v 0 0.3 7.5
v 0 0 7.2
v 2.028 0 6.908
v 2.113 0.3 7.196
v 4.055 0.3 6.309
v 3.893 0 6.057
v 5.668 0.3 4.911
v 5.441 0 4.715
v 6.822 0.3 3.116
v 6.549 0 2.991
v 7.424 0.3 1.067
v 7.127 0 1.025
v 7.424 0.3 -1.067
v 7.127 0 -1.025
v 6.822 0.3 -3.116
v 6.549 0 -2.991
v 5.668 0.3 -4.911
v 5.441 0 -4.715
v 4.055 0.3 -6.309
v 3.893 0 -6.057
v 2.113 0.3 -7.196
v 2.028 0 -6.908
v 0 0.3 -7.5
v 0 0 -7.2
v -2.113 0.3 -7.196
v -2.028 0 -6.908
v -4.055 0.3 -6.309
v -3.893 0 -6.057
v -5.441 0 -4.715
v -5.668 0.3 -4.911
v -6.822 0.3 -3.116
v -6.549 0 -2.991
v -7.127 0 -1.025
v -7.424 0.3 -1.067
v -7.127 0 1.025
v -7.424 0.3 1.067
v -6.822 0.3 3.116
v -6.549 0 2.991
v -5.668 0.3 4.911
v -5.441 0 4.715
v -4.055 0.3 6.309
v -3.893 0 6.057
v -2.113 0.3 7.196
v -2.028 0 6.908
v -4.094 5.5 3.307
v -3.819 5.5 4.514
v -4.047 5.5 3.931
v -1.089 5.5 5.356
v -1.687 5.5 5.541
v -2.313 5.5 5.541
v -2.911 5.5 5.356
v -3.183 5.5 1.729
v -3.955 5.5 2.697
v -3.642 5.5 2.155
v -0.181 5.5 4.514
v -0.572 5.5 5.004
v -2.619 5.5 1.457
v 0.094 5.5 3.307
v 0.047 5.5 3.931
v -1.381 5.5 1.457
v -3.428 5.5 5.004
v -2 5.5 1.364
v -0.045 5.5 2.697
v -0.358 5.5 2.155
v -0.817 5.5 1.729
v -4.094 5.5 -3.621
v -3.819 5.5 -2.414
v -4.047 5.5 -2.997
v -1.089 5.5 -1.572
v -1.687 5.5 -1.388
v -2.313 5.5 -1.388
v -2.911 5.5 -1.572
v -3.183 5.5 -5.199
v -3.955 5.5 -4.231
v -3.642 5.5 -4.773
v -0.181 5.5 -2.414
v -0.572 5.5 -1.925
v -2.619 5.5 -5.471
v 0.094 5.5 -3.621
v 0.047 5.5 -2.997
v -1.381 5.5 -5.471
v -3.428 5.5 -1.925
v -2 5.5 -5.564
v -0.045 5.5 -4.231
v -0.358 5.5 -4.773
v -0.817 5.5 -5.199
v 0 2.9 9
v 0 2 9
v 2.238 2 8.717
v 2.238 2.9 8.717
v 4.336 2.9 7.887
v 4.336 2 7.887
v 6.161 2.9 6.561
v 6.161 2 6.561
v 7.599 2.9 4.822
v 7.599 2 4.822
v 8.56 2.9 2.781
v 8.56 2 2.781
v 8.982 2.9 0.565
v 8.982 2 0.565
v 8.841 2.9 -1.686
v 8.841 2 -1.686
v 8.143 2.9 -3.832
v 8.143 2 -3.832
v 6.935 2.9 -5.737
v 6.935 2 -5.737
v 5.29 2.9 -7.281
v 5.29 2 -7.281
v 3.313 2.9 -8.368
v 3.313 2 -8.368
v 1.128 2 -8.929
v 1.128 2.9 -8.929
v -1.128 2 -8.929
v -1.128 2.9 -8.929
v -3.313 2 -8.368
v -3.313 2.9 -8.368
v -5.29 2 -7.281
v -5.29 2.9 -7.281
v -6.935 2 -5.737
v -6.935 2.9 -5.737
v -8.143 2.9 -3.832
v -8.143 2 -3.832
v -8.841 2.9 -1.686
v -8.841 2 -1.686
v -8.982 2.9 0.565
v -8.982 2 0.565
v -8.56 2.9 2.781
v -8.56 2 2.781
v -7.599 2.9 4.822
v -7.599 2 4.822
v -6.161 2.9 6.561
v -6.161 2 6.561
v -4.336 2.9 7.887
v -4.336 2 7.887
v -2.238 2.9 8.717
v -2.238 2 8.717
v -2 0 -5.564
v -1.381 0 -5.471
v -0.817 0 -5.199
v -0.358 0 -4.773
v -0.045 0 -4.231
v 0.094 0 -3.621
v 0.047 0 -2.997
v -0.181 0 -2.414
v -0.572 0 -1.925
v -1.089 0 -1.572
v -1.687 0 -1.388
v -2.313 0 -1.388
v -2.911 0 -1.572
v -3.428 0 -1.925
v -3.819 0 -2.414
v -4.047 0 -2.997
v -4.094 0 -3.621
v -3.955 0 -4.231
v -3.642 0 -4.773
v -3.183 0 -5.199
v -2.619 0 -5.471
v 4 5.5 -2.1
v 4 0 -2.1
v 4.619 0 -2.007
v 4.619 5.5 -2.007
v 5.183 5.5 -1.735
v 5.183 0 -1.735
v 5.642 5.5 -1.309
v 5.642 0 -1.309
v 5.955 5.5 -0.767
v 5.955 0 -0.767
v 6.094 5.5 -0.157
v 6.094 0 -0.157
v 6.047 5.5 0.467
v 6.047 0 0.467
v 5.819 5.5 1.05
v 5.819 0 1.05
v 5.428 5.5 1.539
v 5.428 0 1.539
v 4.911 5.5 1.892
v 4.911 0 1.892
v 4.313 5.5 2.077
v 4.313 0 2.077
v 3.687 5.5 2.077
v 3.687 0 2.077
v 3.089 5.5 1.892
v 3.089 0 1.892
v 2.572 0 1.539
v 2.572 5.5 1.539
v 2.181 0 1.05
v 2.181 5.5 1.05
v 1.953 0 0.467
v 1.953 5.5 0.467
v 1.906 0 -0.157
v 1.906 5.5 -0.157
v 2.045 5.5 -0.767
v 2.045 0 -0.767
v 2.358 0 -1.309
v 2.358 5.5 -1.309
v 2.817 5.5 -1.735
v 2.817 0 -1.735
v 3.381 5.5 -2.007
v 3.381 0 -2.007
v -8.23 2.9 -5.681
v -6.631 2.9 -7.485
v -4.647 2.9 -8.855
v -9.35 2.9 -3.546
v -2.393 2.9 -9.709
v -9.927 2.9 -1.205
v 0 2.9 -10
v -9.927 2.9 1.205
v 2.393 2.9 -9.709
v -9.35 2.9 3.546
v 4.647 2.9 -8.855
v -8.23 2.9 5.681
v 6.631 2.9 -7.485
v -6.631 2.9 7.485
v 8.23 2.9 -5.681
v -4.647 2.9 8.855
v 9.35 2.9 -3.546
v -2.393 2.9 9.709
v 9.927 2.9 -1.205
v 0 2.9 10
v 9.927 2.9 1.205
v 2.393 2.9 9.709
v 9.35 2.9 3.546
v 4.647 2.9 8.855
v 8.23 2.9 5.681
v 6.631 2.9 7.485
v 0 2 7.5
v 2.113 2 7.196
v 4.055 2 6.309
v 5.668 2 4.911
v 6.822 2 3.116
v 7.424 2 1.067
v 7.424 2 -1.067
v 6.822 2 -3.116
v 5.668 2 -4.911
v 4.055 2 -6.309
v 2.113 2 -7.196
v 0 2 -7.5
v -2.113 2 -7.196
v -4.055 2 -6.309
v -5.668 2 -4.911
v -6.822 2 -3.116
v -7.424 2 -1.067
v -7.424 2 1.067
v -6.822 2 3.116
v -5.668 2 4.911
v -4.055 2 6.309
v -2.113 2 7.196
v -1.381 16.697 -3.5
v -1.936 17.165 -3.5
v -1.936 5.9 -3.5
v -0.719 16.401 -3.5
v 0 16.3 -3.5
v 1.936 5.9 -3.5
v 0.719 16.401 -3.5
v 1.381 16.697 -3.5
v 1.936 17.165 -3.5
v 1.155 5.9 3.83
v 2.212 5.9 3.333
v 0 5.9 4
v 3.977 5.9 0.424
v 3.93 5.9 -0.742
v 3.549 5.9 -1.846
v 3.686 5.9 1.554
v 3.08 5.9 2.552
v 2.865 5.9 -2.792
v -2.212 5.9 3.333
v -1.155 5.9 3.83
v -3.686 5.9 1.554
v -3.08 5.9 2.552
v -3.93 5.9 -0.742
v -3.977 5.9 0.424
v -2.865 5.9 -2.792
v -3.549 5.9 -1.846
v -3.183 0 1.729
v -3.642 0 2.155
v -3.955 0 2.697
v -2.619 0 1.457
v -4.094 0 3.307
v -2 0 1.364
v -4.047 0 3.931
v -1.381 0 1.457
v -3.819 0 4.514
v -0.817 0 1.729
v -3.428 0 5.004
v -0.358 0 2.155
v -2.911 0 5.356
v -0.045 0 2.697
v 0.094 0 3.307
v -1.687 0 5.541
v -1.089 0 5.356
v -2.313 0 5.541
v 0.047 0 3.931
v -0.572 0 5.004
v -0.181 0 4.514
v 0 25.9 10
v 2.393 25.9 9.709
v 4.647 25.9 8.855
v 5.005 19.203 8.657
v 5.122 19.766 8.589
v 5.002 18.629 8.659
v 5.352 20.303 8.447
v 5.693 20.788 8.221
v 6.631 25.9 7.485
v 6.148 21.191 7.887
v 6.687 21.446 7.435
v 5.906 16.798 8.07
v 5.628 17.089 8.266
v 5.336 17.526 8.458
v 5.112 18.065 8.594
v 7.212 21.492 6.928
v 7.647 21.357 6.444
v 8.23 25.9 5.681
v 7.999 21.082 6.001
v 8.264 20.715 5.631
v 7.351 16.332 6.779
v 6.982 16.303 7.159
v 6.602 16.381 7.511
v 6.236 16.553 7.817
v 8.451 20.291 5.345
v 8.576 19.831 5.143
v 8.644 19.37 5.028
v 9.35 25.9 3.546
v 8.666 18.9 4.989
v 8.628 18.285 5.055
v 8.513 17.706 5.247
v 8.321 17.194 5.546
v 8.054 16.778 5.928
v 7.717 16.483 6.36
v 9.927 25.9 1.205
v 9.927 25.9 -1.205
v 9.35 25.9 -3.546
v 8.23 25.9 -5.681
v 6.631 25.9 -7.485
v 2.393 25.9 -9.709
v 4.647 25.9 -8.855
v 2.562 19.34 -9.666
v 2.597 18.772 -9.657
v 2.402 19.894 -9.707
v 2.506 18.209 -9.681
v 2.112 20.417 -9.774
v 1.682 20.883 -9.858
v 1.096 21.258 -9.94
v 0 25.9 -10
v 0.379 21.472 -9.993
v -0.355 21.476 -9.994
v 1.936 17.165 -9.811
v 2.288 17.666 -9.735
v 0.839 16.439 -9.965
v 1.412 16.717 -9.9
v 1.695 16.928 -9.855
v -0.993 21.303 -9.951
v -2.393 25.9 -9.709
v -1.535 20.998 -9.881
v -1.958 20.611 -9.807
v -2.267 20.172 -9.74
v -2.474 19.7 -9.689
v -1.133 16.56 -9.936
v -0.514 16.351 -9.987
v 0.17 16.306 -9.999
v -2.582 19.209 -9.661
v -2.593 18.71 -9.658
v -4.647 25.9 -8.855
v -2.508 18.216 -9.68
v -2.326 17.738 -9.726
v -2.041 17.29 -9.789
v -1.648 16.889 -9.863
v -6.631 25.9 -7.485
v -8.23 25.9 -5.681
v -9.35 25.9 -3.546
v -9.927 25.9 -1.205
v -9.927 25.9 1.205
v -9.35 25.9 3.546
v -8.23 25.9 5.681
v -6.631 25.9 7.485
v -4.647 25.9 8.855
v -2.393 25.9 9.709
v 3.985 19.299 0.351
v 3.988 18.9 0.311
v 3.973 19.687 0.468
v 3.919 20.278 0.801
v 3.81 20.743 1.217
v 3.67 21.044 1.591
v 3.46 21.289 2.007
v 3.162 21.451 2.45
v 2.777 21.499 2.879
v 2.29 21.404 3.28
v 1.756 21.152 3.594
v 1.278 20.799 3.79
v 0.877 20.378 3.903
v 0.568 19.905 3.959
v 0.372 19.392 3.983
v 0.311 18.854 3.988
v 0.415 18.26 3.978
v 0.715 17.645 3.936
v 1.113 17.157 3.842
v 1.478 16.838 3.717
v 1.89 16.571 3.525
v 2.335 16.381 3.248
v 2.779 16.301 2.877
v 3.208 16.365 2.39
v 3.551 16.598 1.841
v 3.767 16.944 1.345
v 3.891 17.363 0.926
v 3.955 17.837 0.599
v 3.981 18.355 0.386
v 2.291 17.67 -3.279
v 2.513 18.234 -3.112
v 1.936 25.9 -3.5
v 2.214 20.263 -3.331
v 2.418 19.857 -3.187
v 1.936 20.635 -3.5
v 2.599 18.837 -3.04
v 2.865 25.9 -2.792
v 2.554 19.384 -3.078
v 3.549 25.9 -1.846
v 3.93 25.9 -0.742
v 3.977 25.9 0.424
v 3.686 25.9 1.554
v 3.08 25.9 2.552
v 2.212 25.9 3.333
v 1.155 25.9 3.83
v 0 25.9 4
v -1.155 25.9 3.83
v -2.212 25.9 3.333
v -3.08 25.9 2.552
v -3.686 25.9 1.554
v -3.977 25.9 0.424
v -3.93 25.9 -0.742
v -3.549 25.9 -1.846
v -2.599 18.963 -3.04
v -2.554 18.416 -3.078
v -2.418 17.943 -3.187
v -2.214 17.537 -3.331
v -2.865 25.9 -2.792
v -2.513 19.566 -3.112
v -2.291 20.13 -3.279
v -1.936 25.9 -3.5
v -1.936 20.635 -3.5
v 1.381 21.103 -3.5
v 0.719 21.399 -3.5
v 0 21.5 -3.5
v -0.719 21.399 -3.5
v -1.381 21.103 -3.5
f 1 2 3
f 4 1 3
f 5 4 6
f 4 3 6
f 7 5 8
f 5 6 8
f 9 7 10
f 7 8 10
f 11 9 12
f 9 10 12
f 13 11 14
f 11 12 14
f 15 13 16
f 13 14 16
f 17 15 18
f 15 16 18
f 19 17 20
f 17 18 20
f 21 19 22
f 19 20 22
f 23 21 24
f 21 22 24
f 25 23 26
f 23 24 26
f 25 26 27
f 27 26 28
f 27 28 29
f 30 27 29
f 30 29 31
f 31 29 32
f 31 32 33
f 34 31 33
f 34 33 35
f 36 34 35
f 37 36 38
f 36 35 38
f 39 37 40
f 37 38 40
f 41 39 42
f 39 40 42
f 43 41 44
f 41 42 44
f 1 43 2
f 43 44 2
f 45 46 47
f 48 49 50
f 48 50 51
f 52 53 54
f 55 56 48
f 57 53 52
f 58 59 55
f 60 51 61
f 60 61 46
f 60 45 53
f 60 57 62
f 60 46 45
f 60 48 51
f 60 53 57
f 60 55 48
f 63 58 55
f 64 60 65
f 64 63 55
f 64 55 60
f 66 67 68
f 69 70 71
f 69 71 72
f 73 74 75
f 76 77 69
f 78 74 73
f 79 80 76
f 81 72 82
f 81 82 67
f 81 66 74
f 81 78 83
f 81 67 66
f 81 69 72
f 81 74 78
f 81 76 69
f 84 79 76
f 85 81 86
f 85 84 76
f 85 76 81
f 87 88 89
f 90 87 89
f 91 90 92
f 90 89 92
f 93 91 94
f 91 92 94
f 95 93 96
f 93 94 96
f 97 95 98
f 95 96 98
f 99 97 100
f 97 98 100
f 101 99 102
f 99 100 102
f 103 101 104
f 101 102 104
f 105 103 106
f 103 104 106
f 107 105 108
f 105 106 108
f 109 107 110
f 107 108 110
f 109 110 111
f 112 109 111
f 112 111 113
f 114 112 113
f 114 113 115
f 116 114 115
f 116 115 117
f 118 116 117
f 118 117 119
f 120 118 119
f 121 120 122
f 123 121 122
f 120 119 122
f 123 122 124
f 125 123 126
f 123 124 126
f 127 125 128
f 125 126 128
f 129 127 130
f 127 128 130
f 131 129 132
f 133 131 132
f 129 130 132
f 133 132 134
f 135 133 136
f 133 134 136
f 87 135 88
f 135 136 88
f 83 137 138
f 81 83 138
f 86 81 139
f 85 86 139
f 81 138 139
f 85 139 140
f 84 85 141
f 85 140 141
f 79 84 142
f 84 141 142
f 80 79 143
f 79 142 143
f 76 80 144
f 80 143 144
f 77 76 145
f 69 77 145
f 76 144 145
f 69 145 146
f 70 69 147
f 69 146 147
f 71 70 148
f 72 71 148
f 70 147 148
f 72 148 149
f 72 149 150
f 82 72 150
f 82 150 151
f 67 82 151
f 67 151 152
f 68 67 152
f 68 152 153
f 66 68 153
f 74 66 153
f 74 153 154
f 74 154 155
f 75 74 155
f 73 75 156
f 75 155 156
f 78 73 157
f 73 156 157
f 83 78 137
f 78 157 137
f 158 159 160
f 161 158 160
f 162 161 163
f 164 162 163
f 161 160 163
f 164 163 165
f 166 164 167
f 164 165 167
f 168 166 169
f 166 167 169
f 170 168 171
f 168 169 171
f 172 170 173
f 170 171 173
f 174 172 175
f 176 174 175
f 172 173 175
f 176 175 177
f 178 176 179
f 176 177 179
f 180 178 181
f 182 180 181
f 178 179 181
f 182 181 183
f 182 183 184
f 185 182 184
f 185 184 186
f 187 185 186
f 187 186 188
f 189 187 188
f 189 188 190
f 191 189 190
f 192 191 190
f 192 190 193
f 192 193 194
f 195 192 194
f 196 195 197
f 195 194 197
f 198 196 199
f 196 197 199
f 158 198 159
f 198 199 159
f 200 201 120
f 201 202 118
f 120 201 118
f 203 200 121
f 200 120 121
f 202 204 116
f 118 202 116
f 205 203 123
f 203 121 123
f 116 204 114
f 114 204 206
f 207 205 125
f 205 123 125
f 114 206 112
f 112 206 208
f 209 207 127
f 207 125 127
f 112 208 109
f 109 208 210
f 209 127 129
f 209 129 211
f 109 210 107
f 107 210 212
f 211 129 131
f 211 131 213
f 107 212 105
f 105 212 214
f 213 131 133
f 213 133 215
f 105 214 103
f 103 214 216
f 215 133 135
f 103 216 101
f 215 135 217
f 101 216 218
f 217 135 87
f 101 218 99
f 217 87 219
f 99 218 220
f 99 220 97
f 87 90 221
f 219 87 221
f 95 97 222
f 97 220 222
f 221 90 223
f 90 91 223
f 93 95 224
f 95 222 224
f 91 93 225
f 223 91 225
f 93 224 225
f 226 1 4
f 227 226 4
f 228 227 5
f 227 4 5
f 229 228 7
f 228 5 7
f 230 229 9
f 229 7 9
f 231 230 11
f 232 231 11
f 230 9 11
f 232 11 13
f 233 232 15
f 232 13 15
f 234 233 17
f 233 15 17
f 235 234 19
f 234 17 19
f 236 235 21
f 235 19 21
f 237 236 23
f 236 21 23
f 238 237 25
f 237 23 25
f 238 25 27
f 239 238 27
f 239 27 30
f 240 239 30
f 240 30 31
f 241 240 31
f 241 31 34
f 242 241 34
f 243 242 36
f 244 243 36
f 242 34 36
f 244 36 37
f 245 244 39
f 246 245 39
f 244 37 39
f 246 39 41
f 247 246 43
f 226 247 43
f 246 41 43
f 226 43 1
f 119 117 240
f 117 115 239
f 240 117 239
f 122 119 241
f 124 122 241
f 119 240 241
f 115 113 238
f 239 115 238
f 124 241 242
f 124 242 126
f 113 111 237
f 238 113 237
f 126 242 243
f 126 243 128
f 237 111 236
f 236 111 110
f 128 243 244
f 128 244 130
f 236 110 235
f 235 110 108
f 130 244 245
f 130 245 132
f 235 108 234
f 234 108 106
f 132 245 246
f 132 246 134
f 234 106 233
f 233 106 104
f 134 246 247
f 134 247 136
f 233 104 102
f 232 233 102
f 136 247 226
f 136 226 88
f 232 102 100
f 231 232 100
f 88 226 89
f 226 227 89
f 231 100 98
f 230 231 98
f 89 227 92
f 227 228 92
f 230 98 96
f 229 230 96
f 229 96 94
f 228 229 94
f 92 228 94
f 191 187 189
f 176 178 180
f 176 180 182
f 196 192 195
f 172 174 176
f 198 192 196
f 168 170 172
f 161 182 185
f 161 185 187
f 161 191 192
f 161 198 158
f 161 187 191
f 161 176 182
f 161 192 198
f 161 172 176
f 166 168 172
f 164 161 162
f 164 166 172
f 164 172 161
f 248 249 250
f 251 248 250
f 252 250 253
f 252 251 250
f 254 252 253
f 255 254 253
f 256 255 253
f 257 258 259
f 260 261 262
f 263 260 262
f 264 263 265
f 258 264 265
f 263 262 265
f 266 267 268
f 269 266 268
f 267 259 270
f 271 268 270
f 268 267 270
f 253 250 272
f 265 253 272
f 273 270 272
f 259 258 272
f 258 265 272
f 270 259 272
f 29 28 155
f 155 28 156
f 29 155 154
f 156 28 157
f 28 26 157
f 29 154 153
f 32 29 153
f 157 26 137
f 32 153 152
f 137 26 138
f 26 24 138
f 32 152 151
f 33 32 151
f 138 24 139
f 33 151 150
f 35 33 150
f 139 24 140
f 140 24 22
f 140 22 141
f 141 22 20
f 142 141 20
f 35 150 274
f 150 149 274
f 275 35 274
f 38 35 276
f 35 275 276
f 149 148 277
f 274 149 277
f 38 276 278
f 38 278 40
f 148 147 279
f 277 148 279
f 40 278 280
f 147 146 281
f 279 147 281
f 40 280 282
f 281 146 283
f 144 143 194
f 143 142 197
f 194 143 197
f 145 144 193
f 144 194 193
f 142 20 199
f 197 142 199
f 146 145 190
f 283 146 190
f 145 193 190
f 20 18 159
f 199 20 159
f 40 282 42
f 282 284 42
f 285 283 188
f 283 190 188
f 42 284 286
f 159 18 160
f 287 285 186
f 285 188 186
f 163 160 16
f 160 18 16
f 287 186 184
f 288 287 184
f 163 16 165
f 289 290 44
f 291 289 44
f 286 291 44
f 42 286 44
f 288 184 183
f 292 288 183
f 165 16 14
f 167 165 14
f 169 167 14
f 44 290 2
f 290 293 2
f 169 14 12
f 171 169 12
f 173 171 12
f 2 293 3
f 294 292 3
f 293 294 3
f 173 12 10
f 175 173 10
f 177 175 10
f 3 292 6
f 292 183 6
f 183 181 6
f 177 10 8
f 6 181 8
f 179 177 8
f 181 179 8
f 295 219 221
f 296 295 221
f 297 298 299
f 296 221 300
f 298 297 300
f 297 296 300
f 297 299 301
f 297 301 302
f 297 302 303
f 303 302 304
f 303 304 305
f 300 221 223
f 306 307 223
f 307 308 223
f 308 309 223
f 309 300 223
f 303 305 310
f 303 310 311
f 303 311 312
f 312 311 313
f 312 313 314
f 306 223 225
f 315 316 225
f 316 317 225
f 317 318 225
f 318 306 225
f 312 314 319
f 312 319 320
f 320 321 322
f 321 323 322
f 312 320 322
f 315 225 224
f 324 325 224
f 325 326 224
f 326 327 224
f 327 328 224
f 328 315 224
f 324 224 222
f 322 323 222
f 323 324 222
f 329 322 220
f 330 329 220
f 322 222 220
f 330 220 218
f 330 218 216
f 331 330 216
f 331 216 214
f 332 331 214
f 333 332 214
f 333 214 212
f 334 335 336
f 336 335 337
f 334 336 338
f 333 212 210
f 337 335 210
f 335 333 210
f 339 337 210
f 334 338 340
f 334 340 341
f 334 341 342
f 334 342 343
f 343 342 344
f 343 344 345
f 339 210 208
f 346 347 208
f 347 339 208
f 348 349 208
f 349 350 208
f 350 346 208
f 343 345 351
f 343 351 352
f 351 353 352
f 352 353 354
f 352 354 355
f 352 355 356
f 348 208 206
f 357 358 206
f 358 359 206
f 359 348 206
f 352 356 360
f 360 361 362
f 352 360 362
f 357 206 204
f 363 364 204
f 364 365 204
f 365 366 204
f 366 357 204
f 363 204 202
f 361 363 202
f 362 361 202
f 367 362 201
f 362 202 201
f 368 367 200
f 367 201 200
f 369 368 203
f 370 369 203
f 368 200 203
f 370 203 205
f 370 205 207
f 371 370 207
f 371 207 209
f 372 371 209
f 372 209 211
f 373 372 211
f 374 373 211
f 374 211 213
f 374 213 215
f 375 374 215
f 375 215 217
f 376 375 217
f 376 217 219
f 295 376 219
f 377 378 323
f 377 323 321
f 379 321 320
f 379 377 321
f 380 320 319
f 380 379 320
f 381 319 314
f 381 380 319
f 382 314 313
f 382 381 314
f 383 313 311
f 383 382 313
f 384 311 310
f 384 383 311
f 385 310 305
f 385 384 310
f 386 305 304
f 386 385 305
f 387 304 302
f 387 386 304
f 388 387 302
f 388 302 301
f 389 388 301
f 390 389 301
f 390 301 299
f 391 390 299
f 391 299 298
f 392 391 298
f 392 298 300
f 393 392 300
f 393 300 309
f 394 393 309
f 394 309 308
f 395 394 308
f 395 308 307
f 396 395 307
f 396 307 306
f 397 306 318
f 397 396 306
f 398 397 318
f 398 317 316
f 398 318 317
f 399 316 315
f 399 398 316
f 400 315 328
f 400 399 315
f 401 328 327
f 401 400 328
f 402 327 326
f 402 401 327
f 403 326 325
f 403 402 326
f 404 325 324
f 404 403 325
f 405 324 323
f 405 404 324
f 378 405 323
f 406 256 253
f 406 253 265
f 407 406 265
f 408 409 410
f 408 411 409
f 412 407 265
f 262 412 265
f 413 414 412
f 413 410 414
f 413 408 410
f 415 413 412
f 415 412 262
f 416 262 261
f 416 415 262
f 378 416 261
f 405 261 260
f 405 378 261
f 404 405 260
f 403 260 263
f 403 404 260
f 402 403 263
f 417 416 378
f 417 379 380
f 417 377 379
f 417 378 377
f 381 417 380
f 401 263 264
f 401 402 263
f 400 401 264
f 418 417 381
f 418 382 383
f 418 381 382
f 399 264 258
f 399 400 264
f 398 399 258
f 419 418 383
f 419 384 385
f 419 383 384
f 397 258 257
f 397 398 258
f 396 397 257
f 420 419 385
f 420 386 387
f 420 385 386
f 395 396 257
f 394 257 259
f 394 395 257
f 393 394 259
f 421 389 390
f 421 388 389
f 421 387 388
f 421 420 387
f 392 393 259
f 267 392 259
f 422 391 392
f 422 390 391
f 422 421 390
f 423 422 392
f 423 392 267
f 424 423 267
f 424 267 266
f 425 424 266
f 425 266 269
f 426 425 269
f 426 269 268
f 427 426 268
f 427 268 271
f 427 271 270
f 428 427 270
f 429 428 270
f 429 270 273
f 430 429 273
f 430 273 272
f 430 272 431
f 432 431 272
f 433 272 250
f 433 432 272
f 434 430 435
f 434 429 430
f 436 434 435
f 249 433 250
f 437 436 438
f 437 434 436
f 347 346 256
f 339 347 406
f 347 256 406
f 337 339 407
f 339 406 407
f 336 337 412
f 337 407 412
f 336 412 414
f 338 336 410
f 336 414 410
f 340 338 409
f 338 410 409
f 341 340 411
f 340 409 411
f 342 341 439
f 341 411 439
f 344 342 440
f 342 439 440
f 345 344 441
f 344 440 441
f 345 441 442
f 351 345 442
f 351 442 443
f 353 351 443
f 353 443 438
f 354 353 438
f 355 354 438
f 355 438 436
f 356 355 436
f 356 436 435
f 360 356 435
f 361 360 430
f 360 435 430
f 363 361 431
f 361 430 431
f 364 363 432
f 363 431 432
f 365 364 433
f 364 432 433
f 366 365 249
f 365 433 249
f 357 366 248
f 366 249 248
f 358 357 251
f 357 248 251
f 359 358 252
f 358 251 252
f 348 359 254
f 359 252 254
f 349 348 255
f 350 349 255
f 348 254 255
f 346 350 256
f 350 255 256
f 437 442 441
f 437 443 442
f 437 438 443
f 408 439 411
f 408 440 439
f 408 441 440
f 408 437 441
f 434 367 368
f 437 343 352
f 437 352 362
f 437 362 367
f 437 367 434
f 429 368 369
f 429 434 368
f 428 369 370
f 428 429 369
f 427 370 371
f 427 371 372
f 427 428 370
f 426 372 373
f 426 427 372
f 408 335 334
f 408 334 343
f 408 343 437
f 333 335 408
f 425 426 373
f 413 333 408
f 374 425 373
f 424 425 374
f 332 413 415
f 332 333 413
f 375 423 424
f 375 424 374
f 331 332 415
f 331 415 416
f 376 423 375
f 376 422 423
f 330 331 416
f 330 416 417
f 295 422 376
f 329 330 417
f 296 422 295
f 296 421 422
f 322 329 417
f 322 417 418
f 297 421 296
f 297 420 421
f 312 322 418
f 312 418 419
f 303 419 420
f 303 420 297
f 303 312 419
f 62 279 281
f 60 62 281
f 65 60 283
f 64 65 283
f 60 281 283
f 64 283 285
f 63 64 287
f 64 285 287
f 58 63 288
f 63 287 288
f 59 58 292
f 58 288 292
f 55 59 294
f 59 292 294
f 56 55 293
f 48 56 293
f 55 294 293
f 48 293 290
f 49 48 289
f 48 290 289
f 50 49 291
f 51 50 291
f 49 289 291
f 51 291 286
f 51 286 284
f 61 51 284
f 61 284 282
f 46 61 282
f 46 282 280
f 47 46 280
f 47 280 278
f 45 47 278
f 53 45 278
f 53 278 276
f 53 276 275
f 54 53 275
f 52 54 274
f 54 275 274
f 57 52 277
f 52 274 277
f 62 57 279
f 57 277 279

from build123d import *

# Parameters (mm, degrees)
SKETCH1_R             = 7.5
BOSS_EXTRUDE1_DEPTH   = 2
SKETCH2_R             = 9
BOSS_EXTRUDE2_DEPTH   = 0.9
SKETCH3_R             = 10
BOSS_EXTRUDE3_DEPTH   = 23
SKETCH5_R             = 2.1
CUT_EXTRUDE1_DEPTH    = 5.5
CUT_EXTRUDE2_DEPTH    = 20
SKETCH7_R             = 2.6
CUT_EXTRUDE3_DEPTH    = 30.509489999
CIRPATTERN1_START     = 3.039736726
CIRPATTERN1_OUTLINE_R = 2.6
CIRPATTERN1_DEPTH     = 6.960263374
CHAMFER1_SIZE         = 0.3


# Read off the part's stored shape, not the designer's step: CirPattern1
with BuildPart() as part:
    # Sketch1 → Boss-Extrude1 (new body)
    with BuildSketch(Plane(origin=(0, 0, 0), x_dir=(1, 0, 0), z_dir=(0, 1, 0))):
        with Locations(Location((0, 0, 0), (0, 0, 270))):
            Circle(SKETCH1_R)
    extrude(amount=BOSS_EXTRUDE1_DEPTH)

    # Sketch2 → Boss-Extrude2 (add)
    with BuildSketch(Plane(origin=(0, 2, 0), x_dir=(1, 0, 0), z_dir=(0, 1, 0))):
        with Locations(Location((0, 0, 0), (0, 0, 270))):
            Circle(SKETCH2_R)
    extrude(amount=BOSS_EXTRUDE2_DEPTH)

    # Sketch3 → Boss-Extrude3 (add)
    with BuildSketch(Plane(origin=(0, 2.9, 0), x_dir=(1, 0, 0), z_dir=(0, 1, 0))):
        with Locations(Location((0, 0, 0), (0, 0, 270))):
            Circle(SKETCH3_R)
    extrude(amount=BOSS_EXTRUDE3_DEPTH)

    # Sketch5 → Cut-Extrude1 (cut)
    with BuildSketch(Plane.XZ):
        with Locations(Location((4, 0, 0), (0, 0, 270))):
            Circle(SKETCH5_R)
        with Locations(Location((-2, -3.464101615, 0), (0, 0, 270))):
            Circle(SKETCH5_R)
        with Locations(Location((-2, 3.464101615, 0), (0, 0, 270))):
            Circle(SKETCH5_R)
    extrude(amount=-CUT_EXTRUDE1_DEPTH, mode=Mode.SUBTRACT)

    # Sketch6 → Cut-Extrude2 (cut)
    with BuildSketch(Plane(origin=(0, 25.9, 0), x_dir=(1, 0, 0), z_dir=(0, 1, 0))):
        with BuildLine():
            Line((-1.936491673, 3.5), (1.936491673, 3.5))
            ThreePointArc((1.936491673, 3.5), (0, -4), (-1.936491673, 3.5))
        make_face()
    extrude(amount=-CUT_EXTRUDE2_DEPTH, mode=Mode.SUBTRACT)

    # Sketch7 → Cut-Extrude3 (cut, through all)
    with BuildSketch(Plane.XY):
        with Locations(Location((0, 18.9, 0), (0, 0, 318.14230882))):
            Circle(SKETCH7_R)
    extrude(amount=-CUT_EXTRUDE3_DEPTH, mode=Mode.SUBTRACT)

    # CirPattern1 outline → CirPattern1 (cut)
    with BuildSketch(Plane(origin=(0, 0, 0), x_dir=(0.7071067811865509, 0, -0.707106781186544), z_dir=(0.707106781186544, 0, 0.707106781186551)).offset(CIRPATTERN1_START)):
        with Locations((0, 18.9)):
            Circle(CIRPATTERN1_OUTLINE_R)
    extrude(amount=CIRPATTERN1_DEPTH, mode=Mode.SUBTRACT)

    # Chamfer1
    chamfer1_edges = [part.edges().sort_by_distance(p)[0] for p in [
        (0, 0, -7.5),
    ]]
    chamfer(chamfer1_edges, length=CHAMFER1_SIZE)


solid = part.part
